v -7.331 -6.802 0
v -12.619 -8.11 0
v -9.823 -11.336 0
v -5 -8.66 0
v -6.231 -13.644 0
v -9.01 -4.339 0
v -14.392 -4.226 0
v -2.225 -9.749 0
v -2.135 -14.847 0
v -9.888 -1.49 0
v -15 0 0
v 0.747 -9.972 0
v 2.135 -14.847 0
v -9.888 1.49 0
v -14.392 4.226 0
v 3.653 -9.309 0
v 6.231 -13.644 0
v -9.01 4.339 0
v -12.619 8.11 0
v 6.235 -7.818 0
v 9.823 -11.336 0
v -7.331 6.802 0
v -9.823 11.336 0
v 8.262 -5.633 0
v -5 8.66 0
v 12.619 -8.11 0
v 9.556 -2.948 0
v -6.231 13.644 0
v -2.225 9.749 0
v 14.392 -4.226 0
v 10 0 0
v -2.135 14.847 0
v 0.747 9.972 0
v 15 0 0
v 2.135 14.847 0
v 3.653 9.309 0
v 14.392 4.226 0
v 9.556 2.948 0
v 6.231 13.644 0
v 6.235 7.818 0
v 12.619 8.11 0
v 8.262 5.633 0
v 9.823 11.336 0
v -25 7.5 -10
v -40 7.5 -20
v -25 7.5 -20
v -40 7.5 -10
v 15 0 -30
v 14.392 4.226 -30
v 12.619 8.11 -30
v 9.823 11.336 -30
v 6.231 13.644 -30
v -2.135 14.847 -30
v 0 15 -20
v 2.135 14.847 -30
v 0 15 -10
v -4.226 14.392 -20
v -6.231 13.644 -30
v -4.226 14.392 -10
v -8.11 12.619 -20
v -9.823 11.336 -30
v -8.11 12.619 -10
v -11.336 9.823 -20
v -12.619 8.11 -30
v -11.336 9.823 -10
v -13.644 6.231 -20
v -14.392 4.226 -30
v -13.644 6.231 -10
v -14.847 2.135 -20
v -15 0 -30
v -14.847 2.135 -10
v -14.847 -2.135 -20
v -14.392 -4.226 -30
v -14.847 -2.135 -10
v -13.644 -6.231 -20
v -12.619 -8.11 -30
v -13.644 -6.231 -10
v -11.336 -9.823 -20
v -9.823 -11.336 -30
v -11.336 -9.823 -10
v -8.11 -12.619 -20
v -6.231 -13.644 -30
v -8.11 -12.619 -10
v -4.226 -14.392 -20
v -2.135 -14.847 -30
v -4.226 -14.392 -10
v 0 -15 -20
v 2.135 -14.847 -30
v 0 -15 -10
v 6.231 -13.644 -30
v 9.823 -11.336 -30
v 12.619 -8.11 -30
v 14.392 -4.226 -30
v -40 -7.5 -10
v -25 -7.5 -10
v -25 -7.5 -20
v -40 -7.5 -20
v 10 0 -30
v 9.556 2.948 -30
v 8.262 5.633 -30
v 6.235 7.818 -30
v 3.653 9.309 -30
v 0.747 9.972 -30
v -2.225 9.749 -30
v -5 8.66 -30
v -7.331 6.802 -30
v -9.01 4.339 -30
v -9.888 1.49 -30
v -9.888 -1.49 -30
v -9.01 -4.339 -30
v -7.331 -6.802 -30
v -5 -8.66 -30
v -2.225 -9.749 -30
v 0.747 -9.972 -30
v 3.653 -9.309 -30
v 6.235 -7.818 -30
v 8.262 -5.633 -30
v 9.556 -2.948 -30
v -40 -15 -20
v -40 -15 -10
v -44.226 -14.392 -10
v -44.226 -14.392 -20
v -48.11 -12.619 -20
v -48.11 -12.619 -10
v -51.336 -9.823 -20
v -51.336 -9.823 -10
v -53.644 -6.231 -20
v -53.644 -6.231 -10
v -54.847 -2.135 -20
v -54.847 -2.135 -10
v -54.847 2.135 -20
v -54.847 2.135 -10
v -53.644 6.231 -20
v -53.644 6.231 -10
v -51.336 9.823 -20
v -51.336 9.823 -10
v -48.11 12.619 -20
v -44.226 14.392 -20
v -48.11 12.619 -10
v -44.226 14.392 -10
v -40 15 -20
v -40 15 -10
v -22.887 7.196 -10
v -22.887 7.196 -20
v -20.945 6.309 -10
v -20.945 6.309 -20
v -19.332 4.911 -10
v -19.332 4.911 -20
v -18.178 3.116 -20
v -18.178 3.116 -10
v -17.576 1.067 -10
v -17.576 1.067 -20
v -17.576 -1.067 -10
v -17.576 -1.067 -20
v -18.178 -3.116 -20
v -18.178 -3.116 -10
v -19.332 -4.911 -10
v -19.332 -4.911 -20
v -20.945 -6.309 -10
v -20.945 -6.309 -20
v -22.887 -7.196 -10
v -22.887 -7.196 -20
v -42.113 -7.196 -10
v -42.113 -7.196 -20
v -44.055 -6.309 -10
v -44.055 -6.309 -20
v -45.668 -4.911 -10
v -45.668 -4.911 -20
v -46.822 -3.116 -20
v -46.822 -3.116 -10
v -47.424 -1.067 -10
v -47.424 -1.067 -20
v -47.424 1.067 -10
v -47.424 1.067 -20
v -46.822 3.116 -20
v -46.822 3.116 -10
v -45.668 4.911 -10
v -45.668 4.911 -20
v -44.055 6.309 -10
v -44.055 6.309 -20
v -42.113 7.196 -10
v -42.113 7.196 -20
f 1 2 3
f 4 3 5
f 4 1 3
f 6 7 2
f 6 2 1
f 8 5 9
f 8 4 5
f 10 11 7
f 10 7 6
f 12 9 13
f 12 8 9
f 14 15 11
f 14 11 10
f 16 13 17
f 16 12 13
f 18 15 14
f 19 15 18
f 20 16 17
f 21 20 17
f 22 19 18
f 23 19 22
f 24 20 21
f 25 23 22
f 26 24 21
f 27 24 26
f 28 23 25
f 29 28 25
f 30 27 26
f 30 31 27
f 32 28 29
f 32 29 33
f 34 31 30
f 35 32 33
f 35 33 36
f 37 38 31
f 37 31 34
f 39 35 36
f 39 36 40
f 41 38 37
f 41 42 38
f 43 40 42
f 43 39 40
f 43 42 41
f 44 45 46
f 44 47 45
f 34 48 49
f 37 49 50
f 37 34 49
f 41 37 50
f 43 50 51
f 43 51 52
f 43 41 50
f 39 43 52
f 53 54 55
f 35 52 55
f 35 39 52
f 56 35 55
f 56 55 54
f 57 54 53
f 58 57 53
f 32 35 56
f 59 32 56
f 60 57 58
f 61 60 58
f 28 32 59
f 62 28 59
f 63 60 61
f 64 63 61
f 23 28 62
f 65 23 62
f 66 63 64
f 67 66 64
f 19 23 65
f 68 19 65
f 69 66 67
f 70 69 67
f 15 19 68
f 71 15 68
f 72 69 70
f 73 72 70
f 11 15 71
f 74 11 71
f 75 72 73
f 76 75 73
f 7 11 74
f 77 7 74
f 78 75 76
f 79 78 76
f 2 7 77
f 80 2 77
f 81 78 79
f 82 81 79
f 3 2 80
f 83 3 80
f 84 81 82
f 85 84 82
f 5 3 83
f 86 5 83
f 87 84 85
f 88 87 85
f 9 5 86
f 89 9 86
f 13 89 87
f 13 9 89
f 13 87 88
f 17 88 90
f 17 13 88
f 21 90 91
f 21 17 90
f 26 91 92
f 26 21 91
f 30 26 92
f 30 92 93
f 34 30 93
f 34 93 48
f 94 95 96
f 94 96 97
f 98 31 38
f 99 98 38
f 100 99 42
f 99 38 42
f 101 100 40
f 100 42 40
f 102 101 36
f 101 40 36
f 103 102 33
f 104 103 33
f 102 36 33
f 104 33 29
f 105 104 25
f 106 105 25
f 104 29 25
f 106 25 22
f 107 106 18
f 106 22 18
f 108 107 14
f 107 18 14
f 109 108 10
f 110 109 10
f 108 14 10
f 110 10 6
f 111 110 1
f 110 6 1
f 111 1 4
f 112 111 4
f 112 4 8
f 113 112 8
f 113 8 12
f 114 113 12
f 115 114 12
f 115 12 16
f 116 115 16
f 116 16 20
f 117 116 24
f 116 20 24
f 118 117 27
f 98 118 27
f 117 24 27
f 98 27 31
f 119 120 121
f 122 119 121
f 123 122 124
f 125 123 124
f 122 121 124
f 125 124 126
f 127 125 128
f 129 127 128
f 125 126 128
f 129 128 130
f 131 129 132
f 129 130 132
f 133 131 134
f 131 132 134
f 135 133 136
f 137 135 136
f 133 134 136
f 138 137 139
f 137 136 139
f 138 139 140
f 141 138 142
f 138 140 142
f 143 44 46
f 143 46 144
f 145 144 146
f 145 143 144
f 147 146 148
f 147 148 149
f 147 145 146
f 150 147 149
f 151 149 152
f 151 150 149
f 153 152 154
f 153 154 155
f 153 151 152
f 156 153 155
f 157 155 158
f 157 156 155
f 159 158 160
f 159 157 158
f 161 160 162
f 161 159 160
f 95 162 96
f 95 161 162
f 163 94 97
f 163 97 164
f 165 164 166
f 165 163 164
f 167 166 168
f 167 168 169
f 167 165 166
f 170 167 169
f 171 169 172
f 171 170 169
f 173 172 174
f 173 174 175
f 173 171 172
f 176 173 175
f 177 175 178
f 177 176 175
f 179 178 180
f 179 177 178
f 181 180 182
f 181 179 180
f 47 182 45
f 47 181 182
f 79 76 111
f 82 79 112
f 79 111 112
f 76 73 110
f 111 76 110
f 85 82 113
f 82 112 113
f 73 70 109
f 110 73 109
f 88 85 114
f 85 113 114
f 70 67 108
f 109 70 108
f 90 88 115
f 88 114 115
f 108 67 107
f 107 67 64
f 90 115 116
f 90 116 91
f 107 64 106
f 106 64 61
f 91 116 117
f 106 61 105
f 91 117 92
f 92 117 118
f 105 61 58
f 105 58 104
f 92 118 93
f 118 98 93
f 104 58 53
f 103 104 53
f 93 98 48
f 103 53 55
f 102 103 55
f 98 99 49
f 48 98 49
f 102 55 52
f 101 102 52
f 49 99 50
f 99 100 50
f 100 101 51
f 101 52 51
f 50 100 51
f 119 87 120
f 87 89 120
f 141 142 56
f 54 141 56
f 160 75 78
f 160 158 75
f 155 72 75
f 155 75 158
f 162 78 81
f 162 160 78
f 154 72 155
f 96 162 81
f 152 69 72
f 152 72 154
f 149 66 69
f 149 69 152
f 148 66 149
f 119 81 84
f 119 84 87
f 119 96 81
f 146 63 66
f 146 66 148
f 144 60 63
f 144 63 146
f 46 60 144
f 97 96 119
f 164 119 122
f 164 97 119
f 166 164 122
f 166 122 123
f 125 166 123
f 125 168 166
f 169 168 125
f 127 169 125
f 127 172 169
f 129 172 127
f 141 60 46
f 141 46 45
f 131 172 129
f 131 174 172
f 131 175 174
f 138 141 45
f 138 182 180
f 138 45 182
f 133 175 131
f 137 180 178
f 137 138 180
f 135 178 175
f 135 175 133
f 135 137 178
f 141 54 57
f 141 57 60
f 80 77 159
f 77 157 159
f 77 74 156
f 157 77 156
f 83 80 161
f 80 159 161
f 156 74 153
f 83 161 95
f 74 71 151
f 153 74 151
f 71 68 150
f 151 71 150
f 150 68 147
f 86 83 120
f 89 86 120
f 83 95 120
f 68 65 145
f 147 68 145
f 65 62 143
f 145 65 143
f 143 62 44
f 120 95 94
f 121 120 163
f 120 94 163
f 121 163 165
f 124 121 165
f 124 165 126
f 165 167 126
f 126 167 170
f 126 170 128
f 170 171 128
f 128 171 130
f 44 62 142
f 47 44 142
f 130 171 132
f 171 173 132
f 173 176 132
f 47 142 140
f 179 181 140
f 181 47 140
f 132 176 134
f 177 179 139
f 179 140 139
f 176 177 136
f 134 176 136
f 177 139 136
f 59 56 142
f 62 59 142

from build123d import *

# Parameters (mm, degrees)
SKETCH1_R           = 15
SKETCH1_R_2         = 10
BOSS_EXTRUDE1_DEPTH = 30
BOSS_EXTRUDE2_DEPTH = 5


with BuildPart() as part:
    # Sketch1 → Boss-Extrude1 (new body)
    with BuildSketch(Plane.XY):
        Circle(SKETCH1_R)
        Circle(SKETCH1_R_2, mode=Mode.SUBTRACT)
    extrude(amount=-BOSS_EXTRUDE1_DEPTH)

    # Sketch2 → Boss-Extrude2 (add, symmetric)
    with BuildSketch(Plane.XY.offset(-15)):
        with BuildLine():
            Line((-40, 15), (0, 15))
            ThreePointArc((0, 15), (-15, 0), (0, -15))
            Line((0, -15), (-40, -15))
            ThreePointArc((-40, -15), (-55, 0), (-40, 15))
        make_face()
        with BuildLine():
            Line((-40, 7.5), (-25, 7.5))
            ThreePointArc((-25, 7.5), (-17.5, 0), (-25, -7.5))
            Line((-25, -7.5), (-40, -7.5))
            ThreePointArc((-40, -7.5), (-47.5, 0), (-40, 7.5))
        make_face(mode=Mode.SUBTRACT)
    extrude(amount=BOSS_EXTRUDE2_DEPTH, both=True)


solid = part.part
